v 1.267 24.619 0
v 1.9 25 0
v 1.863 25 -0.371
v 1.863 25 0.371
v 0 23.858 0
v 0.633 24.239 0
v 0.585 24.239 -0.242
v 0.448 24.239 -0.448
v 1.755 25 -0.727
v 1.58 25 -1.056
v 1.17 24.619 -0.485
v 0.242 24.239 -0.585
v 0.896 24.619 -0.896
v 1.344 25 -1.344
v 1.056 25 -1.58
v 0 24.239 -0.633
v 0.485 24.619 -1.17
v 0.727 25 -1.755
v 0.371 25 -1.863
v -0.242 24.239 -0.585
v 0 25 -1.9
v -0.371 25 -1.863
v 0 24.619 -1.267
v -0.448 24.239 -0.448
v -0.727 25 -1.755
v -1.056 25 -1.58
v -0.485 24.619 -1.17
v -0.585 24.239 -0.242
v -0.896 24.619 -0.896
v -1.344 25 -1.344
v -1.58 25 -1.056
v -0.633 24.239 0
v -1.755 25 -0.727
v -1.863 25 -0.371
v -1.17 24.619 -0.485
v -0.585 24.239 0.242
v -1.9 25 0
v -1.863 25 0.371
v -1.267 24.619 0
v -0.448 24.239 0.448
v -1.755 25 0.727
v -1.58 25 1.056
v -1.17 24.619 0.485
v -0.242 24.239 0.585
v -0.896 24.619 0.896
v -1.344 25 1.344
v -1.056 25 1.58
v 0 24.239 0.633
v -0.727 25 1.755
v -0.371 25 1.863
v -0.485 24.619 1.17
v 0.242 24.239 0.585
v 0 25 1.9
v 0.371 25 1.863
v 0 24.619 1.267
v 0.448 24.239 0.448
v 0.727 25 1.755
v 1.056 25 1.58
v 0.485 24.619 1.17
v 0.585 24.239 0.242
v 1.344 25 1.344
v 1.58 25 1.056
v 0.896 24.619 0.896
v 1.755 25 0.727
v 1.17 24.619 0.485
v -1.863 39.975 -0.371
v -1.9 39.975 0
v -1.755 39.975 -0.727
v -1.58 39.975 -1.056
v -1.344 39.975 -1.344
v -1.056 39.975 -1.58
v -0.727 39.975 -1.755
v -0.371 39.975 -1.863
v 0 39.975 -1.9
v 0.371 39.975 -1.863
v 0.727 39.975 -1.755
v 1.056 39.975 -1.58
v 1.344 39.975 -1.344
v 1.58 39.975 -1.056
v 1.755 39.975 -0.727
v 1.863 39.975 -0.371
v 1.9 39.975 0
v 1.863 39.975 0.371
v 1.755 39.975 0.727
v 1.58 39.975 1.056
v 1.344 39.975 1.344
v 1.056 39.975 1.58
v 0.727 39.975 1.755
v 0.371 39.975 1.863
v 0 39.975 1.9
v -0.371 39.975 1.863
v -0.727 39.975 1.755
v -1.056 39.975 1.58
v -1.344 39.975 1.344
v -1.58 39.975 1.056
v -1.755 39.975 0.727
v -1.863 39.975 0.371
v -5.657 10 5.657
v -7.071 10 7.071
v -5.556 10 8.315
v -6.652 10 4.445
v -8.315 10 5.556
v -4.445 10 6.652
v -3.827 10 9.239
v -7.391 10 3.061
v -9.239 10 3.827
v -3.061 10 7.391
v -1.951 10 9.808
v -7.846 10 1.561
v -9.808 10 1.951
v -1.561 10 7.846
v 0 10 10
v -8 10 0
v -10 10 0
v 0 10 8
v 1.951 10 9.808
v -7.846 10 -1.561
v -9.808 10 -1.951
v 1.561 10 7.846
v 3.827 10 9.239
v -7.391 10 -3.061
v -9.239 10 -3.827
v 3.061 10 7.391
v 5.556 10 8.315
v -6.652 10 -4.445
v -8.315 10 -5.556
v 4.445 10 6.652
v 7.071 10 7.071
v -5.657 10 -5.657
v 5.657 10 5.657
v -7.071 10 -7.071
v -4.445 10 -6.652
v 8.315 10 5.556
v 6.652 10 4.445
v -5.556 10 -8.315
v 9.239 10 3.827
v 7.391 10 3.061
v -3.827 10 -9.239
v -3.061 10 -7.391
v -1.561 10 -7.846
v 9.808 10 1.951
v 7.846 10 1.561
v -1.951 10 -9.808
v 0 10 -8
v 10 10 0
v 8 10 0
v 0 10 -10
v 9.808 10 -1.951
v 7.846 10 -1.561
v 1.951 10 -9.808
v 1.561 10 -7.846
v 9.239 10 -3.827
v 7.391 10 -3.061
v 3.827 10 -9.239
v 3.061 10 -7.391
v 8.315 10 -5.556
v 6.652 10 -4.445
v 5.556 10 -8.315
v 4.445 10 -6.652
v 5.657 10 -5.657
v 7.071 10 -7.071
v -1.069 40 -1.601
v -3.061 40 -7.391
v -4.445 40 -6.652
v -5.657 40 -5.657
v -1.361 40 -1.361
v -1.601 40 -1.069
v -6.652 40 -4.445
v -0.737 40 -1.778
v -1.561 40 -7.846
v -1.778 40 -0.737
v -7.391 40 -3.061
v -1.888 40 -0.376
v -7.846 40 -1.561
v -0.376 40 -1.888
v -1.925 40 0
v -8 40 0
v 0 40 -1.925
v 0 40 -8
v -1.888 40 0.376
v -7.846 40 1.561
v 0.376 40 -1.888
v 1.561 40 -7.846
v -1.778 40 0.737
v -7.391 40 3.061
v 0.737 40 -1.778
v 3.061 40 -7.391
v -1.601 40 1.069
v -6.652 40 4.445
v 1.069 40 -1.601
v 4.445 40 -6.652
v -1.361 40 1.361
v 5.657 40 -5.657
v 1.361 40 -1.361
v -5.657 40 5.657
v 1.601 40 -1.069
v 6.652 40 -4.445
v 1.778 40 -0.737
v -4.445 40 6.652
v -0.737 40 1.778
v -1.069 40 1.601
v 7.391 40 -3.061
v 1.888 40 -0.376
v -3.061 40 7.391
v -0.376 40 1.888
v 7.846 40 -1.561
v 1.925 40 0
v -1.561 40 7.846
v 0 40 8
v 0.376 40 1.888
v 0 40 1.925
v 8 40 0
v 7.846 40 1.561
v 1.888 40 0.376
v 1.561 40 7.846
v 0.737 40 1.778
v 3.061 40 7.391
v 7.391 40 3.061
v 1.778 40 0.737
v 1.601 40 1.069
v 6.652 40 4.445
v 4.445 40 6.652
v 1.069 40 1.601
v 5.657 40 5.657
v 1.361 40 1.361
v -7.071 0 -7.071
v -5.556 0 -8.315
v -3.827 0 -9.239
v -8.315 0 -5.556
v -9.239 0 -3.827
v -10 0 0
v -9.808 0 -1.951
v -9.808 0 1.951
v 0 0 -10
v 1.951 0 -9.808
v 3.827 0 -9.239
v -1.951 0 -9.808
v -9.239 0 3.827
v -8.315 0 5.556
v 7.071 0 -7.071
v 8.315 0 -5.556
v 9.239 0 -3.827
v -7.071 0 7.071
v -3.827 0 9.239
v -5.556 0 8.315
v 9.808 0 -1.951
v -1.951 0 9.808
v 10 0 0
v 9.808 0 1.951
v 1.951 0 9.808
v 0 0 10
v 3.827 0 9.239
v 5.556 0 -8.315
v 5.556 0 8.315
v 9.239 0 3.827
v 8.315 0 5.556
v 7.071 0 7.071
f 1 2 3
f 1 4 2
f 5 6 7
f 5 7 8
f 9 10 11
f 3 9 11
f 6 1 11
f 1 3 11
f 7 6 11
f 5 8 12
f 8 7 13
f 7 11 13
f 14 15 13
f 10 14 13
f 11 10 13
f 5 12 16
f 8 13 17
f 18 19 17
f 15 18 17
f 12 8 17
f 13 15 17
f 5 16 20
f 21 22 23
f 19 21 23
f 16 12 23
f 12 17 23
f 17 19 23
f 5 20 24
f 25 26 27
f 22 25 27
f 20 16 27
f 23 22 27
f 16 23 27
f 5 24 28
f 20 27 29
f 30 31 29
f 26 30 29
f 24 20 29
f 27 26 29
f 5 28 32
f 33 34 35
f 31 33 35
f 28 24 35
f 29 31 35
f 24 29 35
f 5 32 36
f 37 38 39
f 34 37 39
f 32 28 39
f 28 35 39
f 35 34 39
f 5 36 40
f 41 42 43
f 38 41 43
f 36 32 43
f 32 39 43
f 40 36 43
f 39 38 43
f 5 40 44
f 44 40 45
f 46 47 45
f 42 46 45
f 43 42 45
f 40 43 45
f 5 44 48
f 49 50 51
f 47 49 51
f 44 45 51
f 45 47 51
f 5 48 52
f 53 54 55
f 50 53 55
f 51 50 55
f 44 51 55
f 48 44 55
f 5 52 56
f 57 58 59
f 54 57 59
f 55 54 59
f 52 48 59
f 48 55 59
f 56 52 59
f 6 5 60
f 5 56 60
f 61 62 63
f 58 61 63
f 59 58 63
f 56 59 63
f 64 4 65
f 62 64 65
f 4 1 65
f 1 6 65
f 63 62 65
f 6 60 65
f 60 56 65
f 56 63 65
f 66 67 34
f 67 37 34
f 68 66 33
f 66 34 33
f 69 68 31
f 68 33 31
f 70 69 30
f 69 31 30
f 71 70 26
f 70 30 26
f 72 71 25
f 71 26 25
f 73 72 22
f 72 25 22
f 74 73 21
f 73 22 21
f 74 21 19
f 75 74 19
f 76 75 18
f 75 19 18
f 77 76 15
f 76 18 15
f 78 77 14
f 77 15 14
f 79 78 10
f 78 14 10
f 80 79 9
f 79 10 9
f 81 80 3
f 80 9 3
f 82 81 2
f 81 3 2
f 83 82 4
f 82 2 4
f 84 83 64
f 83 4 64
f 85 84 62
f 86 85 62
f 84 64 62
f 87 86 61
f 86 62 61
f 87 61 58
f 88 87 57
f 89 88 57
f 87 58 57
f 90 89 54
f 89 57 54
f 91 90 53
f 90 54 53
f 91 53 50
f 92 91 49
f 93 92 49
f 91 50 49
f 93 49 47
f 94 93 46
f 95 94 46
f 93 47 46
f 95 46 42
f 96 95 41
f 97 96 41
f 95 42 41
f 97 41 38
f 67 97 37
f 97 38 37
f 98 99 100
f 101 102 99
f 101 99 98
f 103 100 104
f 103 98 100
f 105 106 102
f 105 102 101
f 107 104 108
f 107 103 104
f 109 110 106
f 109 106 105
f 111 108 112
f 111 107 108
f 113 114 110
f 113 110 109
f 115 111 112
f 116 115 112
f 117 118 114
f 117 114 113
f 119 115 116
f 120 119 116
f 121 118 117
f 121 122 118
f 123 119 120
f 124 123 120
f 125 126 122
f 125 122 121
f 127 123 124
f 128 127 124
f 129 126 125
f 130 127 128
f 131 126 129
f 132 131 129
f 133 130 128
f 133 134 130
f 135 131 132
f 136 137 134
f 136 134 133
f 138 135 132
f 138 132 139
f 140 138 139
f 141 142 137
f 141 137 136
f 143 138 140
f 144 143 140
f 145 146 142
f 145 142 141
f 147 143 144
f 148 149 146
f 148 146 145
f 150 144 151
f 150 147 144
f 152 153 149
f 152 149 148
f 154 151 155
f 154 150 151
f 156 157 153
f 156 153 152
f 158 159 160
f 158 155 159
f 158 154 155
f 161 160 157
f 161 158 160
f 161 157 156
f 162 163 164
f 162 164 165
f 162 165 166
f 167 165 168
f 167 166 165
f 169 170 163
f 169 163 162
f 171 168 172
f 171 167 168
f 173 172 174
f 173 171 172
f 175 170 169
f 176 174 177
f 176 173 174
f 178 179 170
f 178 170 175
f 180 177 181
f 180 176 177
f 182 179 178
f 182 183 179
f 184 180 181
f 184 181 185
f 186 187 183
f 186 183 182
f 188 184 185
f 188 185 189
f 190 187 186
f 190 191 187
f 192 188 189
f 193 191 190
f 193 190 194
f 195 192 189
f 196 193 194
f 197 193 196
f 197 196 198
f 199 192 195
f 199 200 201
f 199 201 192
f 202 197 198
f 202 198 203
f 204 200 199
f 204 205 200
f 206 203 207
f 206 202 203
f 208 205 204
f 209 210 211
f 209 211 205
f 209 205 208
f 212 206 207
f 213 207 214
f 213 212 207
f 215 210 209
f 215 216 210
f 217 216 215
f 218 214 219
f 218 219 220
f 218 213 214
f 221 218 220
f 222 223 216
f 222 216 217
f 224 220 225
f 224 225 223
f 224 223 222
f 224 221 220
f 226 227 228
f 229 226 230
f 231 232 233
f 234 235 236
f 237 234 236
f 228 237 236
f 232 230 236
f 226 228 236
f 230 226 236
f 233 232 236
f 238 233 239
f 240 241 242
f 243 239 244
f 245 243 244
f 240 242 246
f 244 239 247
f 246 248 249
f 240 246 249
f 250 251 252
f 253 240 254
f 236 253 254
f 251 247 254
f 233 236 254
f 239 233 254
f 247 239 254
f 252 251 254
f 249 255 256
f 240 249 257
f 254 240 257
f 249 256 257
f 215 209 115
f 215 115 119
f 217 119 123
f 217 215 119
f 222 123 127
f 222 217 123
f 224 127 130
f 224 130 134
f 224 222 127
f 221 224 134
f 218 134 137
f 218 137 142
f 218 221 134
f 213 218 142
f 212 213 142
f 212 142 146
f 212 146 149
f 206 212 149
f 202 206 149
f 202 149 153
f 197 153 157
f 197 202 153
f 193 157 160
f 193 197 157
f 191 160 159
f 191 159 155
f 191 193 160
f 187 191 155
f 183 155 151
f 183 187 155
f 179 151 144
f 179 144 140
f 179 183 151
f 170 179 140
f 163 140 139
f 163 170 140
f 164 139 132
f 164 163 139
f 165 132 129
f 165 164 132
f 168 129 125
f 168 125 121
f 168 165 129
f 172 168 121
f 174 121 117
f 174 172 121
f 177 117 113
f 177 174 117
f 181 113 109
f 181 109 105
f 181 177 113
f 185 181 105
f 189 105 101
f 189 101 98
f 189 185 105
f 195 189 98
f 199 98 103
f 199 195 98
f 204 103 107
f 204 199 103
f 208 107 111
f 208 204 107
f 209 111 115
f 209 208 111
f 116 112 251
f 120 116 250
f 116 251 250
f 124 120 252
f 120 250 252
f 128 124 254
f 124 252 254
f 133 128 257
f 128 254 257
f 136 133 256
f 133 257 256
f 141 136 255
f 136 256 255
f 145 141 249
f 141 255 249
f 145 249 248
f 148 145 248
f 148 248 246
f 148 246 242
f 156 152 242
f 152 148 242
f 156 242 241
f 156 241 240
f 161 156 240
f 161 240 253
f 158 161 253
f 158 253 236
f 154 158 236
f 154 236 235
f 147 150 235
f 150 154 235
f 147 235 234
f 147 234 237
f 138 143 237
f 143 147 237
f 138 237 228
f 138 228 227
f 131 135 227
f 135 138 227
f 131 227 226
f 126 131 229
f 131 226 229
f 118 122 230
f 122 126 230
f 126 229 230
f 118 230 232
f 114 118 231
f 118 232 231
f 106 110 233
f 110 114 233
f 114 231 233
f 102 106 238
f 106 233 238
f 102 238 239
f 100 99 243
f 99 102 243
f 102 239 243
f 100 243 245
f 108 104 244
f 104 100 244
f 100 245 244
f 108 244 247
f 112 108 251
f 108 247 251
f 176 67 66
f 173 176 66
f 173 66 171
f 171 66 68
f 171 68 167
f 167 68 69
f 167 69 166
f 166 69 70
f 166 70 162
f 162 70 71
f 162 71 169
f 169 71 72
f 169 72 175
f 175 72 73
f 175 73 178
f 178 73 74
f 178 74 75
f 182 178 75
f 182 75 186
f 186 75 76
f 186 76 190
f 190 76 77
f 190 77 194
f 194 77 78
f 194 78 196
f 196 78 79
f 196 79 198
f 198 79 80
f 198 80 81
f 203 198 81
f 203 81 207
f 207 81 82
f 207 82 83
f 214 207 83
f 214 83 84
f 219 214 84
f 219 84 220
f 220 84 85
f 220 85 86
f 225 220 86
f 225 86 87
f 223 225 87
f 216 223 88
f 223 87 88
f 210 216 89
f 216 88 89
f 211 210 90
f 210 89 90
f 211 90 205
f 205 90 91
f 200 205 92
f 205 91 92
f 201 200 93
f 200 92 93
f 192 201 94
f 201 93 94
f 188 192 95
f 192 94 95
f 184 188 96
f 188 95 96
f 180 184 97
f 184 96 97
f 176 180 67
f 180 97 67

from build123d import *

# Parameters (mm, degrees)
SKETCH1_R                            = 10
BOSS_EXTRUDE1_DEPTH                  = 40
F_3_8_3_8_DIAMETER_HOLE1_D           = 3.8
F_3_8_3_8_DIAMETER_HOLE1_DEPTH       = 15
F_3_8_3_8_DIAMETER_HOLE1_CSINK_D     = 3.85
F_3_8_3_8_DIAMETER_HOLE1_CSINK_ANGLE = 90
F_3_8_3_8_DIAMETER_HOLE1_TIP         = 1.141635176
SKETCH5_R                            = 13.85296062
SKETCH5_R_2                          = 8
CUT_EXTRUDE1_DEPTH                   = 30


with BuildPart() as part:
    # Sketch1 → Boss-Extrude1 (new body)
    with BuildSketch(Plane(origin=(0, 0, 0), x_dir=(1, 0, 0), z_dir=(0, 1, 0))):
        with Locations(Location((0, 0, 0), (0, 0, 270))):
            Circle(SKETCH1_R)
    extrude(amount=BOSS_EXTRUDE1_DEPTH)

    # Ø3.8 (3.8) Diameter Hole1
    with Locations(Plane(origin=(0, 40, 0), x_dir=(1, 0, 0), z_dir=(0, 1, 0))):
        with Locations((0, 0)):
            CounterSinkHole(F_3_8_3_8_DIAMETER_HOLE1_D / 2, F_3_8_3_8_DIAMETER_HOLE1_CSINK_D / 2, depth=F_3_8_3_8_DIAMETER_HOLE1_DEPTH, counter_sink_angle=F_3_8_3_8_DIAMETER_HOLE1_CSINK_ANGLE)
            with Locations((0, 0, -(F_3_8_3_8_DIAMETER_HOLE1_DEPTH + F_3_8_3_8_DIAMETER_HOLE1_TIP / 2))):  # 118° drill point
                Cone(0, F_3_8_3_8_DIAMETER_HOLE1_D / 2, F_3_8_3_8_DIAMETER_HOLE1_TIP, mode=Mode.SUBTRACT)

    # Sketch5 → Cut-Extrude1 (cut)
    with BuildSketch(Plane(origin=(0, 40, 0), x_dir=(1, 0, 0), z_dir=(0, 1, 0))):
        Circle(SKETCH5_R)
        with Locations(Location((0, 0, 0), (0, 0, 270))):
            Circle(SKETCH5_R_2, mode=Mode.SUBTRACT)
    extrude(amount=-CUT_EXTRUDE1_DEPTH, mode=Mode.SUBTRACT)


solid = part.part
